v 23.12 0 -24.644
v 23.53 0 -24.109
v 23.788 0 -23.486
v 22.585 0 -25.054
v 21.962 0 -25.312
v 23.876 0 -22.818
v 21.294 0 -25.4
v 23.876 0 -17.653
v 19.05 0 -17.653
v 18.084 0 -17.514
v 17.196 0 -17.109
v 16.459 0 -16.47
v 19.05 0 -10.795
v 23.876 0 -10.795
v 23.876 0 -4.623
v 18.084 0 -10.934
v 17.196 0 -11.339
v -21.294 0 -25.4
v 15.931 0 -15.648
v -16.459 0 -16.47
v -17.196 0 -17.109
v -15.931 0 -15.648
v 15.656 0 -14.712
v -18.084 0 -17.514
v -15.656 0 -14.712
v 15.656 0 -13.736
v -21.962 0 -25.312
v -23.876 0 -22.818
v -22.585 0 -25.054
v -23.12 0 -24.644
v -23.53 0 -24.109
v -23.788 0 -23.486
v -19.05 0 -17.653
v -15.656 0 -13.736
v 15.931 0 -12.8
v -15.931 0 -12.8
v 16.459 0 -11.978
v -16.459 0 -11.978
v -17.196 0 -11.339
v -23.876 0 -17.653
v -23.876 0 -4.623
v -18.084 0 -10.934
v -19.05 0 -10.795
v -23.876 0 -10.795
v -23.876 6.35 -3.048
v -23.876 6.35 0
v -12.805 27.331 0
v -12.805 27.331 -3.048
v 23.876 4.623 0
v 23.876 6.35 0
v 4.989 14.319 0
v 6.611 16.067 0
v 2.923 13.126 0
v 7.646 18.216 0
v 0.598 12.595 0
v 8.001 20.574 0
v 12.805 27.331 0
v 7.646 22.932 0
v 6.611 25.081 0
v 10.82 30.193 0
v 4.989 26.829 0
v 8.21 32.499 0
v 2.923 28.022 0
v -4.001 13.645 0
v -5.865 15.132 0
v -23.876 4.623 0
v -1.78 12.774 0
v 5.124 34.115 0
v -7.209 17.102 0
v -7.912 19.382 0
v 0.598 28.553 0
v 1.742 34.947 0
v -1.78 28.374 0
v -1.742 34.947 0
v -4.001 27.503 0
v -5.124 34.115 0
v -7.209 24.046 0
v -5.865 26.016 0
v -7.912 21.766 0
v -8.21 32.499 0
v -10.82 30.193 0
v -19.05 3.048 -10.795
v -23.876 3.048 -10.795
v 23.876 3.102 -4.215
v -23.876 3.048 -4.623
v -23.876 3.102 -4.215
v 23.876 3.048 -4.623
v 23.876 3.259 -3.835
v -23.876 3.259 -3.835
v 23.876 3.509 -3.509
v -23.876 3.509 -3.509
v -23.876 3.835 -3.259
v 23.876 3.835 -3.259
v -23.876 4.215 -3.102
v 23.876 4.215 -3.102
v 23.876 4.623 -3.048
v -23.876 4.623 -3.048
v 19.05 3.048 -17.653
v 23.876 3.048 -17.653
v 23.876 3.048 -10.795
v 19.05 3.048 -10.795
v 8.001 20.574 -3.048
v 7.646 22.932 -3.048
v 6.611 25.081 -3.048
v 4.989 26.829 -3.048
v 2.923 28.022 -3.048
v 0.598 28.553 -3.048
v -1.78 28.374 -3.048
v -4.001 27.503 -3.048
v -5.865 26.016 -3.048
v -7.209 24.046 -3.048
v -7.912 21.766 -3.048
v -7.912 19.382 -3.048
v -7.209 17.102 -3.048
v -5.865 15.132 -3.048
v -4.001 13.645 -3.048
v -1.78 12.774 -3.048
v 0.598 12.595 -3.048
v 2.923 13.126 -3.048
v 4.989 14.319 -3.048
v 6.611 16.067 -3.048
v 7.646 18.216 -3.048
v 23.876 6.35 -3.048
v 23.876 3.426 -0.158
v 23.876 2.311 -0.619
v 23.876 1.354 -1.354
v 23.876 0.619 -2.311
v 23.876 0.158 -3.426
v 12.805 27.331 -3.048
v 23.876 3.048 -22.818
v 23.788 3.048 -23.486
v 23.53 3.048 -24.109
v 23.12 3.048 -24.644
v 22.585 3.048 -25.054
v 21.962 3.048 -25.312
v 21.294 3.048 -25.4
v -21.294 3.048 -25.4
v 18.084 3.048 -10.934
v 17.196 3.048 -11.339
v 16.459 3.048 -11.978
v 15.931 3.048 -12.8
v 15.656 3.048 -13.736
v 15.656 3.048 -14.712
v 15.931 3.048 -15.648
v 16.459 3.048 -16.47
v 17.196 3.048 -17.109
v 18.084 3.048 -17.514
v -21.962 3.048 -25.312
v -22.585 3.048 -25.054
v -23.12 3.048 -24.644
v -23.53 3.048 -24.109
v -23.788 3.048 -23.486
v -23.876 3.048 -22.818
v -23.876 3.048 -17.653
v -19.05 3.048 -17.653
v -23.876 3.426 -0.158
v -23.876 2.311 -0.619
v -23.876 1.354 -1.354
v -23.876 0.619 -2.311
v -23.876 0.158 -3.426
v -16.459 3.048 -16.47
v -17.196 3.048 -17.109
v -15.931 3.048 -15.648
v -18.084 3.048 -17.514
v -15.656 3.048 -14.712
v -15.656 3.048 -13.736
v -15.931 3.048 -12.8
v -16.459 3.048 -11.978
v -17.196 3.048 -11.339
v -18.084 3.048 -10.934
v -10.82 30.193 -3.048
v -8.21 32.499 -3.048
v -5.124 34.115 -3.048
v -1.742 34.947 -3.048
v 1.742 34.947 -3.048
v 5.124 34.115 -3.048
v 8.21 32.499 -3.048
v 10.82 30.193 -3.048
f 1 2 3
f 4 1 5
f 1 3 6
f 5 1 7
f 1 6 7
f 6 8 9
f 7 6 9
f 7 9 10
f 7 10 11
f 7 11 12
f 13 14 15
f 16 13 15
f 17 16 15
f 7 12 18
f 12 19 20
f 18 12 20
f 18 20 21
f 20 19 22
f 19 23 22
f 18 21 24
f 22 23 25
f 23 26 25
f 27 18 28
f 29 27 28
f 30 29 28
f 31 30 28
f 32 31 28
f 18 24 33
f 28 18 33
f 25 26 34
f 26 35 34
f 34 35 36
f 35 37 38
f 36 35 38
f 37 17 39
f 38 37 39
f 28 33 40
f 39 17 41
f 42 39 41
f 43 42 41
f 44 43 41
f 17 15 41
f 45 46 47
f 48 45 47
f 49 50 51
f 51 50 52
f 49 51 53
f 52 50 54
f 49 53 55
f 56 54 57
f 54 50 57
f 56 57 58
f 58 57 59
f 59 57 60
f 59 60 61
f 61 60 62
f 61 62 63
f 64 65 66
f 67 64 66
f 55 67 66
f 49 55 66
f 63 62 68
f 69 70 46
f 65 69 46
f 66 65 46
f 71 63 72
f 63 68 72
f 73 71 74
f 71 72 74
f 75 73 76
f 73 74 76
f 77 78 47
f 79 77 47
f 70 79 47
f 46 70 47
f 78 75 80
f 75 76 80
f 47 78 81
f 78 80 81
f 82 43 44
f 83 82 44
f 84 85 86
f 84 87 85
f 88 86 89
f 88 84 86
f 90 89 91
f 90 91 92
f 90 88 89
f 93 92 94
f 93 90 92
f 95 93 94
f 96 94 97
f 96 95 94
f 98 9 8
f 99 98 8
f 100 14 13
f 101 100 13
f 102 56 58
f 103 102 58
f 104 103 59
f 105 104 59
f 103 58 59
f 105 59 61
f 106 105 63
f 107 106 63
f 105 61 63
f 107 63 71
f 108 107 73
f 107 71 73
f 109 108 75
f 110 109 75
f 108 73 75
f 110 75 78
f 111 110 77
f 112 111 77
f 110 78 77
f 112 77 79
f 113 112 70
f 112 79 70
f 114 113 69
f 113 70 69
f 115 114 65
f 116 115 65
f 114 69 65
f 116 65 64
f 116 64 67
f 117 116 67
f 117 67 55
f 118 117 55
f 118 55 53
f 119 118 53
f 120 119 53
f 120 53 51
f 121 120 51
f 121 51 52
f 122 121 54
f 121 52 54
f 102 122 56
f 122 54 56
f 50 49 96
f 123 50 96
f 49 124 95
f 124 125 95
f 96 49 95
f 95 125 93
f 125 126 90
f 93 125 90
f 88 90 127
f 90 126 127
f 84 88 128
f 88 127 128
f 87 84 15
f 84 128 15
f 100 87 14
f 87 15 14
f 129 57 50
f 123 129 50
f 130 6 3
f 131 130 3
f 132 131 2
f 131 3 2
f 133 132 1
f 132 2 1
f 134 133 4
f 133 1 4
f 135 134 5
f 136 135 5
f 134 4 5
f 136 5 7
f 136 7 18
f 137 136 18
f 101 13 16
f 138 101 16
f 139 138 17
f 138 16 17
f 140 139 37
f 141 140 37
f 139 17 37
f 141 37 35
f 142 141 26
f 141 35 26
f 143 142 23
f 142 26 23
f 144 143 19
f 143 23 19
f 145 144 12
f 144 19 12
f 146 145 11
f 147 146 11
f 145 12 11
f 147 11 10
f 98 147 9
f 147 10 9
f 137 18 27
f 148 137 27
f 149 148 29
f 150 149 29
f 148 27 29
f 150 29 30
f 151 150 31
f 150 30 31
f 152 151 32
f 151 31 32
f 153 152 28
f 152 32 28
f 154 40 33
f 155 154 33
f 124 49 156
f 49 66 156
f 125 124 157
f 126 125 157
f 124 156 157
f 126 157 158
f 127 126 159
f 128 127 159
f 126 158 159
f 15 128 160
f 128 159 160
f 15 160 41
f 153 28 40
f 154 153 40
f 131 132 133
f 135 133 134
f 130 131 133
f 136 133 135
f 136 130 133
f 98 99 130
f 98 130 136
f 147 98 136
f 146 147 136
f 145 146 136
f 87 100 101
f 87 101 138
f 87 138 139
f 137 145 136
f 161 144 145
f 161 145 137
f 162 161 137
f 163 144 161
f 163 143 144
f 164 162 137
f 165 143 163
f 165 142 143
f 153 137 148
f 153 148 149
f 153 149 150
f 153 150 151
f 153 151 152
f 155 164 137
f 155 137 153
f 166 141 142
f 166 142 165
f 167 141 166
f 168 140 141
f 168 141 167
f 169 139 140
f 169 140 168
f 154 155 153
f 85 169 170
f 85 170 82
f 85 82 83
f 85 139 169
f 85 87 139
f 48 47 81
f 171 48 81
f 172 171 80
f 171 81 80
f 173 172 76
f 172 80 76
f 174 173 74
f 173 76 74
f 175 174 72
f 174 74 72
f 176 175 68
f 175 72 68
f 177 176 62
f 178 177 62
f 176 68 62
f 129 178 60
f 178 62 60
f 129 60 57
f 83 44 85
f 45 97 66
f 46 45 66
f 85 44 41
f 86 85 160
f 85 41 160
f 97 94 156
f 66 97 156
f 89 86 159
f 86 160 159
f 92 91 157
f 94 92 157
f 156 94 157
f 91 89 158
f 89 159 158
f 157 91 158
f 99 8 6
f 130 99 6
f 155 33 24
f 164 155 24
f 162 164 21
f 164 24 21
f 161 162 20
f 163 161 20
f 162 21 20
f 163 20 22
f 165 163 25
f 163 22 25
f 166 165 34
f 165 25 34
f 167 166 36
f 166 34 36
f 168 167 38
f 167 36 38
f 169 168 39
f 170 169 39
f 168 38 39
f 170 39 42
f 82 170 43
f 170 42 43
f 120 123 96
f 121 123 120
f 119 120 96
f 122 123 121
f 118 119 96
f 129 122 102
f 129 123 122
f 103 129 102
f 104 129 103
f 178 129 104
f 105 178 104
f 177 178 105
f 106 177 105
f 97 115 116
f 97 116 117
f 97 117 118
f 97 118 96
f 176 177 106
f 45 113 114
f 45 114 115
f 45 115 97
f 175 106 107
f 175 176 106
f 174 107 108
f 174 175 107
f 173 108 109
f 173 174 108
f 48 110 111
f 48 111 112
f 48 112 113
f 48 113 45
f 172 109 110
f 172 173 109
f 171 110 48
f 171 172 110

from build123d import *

# Parameters (mm, degrees)
SKETCH1_R           = 8.001
BOSS_EXTRUDE1_DEPTH = 3.048
BOSS_EXTRUDE2_DEPTH = 3.048
FILLET1_R           = 1.5748
FILLET2_R           = 4.6228


with BuildPart() as part:
    # Sketch1 → Boss-Extrude1 (new body)
    with BuildSketch(Plane.XY):
        with BuildLine():
            Line((-23.876, 6.35), (-12.804579401, 27.330865424))
            ThreePointArc((-12.804579401, 27.330865424), (0, 35.052), (12.804579401, 27.330865424))
            Line((12.804579401, 27.330865424), (23.876, 6.35))
            Line((23.876, 6.35), (23.876, 0))
            Line((23.876, 0), (-23.876, 0))
            Line((-23.876, 0), (-23.876, 6.35))
        make_face()
        with Locations((0, 20.574)):
            Circle(SKETCH1_R, mode=Mode.SUBTRACT)
    extrude(amount=-BOSS_EXTRUDE1_DEPTH)

    # Sketch2 → Boss-Extrude2 (add)
    with BuildSketch(Plane.XZ):
        with BuildLine():
            Line((23.876, -10.795), (19.05, -10.795))
            ThreePointArc((19.05, -10.795), (15.621, -14.224), (19.05, -17.653))
            Line((19.05, -17.653), (23.876, -17.653))
            Line((23.876, -17.653), (23.876, -22.817666667))
            ThreePointArc((23.876, -22.817666667), (23.119652078, -24.643652078), (21.293666667, -25.4))
            Line((21.293666667, -25.4), (-21.293666667, -25.4))
            ThreePointArc((-21.293666667, -25.4), (-23.119652078, -24.643652078), (-23.876, -22.817666667))
            Line((-23.876, -22.817666667), (-23.876, -17.653))
            Line((-23.876, -17.653), (-19.05, -17.653))
            ThreePointArc((-19.05, -17.653), (-15.621, -14.224), (-19.05, -10.795))
            Line((-19.05, -10.795), (-23.876, -10.795))
            Line((-23.876, -10.795), (-23.876, 0))
            Line((-23.876, 0), (23.876, 0))
            Line((23.876, 0), (23.876, -10.795))
        make_face()
    extrude(amount=-BOSS_EXTRUDE2_DEPTH)

    # Fillet1
    fillet1_edges = [part.edges().sort_by_distance(p)[0] for p in [
        (0, 3.048, -3.048),
    ]]
    fillet(fillet1_edges, radius=FILLET1_R)

    # Fillet2
    fillet2_edges = [part.edges().sort_by_distance(p)[0] for p in [
        (0, 0, 0),
    ]]
    fillet(fillet2_edges, radius=FILLET2_R)


solid = part.part
